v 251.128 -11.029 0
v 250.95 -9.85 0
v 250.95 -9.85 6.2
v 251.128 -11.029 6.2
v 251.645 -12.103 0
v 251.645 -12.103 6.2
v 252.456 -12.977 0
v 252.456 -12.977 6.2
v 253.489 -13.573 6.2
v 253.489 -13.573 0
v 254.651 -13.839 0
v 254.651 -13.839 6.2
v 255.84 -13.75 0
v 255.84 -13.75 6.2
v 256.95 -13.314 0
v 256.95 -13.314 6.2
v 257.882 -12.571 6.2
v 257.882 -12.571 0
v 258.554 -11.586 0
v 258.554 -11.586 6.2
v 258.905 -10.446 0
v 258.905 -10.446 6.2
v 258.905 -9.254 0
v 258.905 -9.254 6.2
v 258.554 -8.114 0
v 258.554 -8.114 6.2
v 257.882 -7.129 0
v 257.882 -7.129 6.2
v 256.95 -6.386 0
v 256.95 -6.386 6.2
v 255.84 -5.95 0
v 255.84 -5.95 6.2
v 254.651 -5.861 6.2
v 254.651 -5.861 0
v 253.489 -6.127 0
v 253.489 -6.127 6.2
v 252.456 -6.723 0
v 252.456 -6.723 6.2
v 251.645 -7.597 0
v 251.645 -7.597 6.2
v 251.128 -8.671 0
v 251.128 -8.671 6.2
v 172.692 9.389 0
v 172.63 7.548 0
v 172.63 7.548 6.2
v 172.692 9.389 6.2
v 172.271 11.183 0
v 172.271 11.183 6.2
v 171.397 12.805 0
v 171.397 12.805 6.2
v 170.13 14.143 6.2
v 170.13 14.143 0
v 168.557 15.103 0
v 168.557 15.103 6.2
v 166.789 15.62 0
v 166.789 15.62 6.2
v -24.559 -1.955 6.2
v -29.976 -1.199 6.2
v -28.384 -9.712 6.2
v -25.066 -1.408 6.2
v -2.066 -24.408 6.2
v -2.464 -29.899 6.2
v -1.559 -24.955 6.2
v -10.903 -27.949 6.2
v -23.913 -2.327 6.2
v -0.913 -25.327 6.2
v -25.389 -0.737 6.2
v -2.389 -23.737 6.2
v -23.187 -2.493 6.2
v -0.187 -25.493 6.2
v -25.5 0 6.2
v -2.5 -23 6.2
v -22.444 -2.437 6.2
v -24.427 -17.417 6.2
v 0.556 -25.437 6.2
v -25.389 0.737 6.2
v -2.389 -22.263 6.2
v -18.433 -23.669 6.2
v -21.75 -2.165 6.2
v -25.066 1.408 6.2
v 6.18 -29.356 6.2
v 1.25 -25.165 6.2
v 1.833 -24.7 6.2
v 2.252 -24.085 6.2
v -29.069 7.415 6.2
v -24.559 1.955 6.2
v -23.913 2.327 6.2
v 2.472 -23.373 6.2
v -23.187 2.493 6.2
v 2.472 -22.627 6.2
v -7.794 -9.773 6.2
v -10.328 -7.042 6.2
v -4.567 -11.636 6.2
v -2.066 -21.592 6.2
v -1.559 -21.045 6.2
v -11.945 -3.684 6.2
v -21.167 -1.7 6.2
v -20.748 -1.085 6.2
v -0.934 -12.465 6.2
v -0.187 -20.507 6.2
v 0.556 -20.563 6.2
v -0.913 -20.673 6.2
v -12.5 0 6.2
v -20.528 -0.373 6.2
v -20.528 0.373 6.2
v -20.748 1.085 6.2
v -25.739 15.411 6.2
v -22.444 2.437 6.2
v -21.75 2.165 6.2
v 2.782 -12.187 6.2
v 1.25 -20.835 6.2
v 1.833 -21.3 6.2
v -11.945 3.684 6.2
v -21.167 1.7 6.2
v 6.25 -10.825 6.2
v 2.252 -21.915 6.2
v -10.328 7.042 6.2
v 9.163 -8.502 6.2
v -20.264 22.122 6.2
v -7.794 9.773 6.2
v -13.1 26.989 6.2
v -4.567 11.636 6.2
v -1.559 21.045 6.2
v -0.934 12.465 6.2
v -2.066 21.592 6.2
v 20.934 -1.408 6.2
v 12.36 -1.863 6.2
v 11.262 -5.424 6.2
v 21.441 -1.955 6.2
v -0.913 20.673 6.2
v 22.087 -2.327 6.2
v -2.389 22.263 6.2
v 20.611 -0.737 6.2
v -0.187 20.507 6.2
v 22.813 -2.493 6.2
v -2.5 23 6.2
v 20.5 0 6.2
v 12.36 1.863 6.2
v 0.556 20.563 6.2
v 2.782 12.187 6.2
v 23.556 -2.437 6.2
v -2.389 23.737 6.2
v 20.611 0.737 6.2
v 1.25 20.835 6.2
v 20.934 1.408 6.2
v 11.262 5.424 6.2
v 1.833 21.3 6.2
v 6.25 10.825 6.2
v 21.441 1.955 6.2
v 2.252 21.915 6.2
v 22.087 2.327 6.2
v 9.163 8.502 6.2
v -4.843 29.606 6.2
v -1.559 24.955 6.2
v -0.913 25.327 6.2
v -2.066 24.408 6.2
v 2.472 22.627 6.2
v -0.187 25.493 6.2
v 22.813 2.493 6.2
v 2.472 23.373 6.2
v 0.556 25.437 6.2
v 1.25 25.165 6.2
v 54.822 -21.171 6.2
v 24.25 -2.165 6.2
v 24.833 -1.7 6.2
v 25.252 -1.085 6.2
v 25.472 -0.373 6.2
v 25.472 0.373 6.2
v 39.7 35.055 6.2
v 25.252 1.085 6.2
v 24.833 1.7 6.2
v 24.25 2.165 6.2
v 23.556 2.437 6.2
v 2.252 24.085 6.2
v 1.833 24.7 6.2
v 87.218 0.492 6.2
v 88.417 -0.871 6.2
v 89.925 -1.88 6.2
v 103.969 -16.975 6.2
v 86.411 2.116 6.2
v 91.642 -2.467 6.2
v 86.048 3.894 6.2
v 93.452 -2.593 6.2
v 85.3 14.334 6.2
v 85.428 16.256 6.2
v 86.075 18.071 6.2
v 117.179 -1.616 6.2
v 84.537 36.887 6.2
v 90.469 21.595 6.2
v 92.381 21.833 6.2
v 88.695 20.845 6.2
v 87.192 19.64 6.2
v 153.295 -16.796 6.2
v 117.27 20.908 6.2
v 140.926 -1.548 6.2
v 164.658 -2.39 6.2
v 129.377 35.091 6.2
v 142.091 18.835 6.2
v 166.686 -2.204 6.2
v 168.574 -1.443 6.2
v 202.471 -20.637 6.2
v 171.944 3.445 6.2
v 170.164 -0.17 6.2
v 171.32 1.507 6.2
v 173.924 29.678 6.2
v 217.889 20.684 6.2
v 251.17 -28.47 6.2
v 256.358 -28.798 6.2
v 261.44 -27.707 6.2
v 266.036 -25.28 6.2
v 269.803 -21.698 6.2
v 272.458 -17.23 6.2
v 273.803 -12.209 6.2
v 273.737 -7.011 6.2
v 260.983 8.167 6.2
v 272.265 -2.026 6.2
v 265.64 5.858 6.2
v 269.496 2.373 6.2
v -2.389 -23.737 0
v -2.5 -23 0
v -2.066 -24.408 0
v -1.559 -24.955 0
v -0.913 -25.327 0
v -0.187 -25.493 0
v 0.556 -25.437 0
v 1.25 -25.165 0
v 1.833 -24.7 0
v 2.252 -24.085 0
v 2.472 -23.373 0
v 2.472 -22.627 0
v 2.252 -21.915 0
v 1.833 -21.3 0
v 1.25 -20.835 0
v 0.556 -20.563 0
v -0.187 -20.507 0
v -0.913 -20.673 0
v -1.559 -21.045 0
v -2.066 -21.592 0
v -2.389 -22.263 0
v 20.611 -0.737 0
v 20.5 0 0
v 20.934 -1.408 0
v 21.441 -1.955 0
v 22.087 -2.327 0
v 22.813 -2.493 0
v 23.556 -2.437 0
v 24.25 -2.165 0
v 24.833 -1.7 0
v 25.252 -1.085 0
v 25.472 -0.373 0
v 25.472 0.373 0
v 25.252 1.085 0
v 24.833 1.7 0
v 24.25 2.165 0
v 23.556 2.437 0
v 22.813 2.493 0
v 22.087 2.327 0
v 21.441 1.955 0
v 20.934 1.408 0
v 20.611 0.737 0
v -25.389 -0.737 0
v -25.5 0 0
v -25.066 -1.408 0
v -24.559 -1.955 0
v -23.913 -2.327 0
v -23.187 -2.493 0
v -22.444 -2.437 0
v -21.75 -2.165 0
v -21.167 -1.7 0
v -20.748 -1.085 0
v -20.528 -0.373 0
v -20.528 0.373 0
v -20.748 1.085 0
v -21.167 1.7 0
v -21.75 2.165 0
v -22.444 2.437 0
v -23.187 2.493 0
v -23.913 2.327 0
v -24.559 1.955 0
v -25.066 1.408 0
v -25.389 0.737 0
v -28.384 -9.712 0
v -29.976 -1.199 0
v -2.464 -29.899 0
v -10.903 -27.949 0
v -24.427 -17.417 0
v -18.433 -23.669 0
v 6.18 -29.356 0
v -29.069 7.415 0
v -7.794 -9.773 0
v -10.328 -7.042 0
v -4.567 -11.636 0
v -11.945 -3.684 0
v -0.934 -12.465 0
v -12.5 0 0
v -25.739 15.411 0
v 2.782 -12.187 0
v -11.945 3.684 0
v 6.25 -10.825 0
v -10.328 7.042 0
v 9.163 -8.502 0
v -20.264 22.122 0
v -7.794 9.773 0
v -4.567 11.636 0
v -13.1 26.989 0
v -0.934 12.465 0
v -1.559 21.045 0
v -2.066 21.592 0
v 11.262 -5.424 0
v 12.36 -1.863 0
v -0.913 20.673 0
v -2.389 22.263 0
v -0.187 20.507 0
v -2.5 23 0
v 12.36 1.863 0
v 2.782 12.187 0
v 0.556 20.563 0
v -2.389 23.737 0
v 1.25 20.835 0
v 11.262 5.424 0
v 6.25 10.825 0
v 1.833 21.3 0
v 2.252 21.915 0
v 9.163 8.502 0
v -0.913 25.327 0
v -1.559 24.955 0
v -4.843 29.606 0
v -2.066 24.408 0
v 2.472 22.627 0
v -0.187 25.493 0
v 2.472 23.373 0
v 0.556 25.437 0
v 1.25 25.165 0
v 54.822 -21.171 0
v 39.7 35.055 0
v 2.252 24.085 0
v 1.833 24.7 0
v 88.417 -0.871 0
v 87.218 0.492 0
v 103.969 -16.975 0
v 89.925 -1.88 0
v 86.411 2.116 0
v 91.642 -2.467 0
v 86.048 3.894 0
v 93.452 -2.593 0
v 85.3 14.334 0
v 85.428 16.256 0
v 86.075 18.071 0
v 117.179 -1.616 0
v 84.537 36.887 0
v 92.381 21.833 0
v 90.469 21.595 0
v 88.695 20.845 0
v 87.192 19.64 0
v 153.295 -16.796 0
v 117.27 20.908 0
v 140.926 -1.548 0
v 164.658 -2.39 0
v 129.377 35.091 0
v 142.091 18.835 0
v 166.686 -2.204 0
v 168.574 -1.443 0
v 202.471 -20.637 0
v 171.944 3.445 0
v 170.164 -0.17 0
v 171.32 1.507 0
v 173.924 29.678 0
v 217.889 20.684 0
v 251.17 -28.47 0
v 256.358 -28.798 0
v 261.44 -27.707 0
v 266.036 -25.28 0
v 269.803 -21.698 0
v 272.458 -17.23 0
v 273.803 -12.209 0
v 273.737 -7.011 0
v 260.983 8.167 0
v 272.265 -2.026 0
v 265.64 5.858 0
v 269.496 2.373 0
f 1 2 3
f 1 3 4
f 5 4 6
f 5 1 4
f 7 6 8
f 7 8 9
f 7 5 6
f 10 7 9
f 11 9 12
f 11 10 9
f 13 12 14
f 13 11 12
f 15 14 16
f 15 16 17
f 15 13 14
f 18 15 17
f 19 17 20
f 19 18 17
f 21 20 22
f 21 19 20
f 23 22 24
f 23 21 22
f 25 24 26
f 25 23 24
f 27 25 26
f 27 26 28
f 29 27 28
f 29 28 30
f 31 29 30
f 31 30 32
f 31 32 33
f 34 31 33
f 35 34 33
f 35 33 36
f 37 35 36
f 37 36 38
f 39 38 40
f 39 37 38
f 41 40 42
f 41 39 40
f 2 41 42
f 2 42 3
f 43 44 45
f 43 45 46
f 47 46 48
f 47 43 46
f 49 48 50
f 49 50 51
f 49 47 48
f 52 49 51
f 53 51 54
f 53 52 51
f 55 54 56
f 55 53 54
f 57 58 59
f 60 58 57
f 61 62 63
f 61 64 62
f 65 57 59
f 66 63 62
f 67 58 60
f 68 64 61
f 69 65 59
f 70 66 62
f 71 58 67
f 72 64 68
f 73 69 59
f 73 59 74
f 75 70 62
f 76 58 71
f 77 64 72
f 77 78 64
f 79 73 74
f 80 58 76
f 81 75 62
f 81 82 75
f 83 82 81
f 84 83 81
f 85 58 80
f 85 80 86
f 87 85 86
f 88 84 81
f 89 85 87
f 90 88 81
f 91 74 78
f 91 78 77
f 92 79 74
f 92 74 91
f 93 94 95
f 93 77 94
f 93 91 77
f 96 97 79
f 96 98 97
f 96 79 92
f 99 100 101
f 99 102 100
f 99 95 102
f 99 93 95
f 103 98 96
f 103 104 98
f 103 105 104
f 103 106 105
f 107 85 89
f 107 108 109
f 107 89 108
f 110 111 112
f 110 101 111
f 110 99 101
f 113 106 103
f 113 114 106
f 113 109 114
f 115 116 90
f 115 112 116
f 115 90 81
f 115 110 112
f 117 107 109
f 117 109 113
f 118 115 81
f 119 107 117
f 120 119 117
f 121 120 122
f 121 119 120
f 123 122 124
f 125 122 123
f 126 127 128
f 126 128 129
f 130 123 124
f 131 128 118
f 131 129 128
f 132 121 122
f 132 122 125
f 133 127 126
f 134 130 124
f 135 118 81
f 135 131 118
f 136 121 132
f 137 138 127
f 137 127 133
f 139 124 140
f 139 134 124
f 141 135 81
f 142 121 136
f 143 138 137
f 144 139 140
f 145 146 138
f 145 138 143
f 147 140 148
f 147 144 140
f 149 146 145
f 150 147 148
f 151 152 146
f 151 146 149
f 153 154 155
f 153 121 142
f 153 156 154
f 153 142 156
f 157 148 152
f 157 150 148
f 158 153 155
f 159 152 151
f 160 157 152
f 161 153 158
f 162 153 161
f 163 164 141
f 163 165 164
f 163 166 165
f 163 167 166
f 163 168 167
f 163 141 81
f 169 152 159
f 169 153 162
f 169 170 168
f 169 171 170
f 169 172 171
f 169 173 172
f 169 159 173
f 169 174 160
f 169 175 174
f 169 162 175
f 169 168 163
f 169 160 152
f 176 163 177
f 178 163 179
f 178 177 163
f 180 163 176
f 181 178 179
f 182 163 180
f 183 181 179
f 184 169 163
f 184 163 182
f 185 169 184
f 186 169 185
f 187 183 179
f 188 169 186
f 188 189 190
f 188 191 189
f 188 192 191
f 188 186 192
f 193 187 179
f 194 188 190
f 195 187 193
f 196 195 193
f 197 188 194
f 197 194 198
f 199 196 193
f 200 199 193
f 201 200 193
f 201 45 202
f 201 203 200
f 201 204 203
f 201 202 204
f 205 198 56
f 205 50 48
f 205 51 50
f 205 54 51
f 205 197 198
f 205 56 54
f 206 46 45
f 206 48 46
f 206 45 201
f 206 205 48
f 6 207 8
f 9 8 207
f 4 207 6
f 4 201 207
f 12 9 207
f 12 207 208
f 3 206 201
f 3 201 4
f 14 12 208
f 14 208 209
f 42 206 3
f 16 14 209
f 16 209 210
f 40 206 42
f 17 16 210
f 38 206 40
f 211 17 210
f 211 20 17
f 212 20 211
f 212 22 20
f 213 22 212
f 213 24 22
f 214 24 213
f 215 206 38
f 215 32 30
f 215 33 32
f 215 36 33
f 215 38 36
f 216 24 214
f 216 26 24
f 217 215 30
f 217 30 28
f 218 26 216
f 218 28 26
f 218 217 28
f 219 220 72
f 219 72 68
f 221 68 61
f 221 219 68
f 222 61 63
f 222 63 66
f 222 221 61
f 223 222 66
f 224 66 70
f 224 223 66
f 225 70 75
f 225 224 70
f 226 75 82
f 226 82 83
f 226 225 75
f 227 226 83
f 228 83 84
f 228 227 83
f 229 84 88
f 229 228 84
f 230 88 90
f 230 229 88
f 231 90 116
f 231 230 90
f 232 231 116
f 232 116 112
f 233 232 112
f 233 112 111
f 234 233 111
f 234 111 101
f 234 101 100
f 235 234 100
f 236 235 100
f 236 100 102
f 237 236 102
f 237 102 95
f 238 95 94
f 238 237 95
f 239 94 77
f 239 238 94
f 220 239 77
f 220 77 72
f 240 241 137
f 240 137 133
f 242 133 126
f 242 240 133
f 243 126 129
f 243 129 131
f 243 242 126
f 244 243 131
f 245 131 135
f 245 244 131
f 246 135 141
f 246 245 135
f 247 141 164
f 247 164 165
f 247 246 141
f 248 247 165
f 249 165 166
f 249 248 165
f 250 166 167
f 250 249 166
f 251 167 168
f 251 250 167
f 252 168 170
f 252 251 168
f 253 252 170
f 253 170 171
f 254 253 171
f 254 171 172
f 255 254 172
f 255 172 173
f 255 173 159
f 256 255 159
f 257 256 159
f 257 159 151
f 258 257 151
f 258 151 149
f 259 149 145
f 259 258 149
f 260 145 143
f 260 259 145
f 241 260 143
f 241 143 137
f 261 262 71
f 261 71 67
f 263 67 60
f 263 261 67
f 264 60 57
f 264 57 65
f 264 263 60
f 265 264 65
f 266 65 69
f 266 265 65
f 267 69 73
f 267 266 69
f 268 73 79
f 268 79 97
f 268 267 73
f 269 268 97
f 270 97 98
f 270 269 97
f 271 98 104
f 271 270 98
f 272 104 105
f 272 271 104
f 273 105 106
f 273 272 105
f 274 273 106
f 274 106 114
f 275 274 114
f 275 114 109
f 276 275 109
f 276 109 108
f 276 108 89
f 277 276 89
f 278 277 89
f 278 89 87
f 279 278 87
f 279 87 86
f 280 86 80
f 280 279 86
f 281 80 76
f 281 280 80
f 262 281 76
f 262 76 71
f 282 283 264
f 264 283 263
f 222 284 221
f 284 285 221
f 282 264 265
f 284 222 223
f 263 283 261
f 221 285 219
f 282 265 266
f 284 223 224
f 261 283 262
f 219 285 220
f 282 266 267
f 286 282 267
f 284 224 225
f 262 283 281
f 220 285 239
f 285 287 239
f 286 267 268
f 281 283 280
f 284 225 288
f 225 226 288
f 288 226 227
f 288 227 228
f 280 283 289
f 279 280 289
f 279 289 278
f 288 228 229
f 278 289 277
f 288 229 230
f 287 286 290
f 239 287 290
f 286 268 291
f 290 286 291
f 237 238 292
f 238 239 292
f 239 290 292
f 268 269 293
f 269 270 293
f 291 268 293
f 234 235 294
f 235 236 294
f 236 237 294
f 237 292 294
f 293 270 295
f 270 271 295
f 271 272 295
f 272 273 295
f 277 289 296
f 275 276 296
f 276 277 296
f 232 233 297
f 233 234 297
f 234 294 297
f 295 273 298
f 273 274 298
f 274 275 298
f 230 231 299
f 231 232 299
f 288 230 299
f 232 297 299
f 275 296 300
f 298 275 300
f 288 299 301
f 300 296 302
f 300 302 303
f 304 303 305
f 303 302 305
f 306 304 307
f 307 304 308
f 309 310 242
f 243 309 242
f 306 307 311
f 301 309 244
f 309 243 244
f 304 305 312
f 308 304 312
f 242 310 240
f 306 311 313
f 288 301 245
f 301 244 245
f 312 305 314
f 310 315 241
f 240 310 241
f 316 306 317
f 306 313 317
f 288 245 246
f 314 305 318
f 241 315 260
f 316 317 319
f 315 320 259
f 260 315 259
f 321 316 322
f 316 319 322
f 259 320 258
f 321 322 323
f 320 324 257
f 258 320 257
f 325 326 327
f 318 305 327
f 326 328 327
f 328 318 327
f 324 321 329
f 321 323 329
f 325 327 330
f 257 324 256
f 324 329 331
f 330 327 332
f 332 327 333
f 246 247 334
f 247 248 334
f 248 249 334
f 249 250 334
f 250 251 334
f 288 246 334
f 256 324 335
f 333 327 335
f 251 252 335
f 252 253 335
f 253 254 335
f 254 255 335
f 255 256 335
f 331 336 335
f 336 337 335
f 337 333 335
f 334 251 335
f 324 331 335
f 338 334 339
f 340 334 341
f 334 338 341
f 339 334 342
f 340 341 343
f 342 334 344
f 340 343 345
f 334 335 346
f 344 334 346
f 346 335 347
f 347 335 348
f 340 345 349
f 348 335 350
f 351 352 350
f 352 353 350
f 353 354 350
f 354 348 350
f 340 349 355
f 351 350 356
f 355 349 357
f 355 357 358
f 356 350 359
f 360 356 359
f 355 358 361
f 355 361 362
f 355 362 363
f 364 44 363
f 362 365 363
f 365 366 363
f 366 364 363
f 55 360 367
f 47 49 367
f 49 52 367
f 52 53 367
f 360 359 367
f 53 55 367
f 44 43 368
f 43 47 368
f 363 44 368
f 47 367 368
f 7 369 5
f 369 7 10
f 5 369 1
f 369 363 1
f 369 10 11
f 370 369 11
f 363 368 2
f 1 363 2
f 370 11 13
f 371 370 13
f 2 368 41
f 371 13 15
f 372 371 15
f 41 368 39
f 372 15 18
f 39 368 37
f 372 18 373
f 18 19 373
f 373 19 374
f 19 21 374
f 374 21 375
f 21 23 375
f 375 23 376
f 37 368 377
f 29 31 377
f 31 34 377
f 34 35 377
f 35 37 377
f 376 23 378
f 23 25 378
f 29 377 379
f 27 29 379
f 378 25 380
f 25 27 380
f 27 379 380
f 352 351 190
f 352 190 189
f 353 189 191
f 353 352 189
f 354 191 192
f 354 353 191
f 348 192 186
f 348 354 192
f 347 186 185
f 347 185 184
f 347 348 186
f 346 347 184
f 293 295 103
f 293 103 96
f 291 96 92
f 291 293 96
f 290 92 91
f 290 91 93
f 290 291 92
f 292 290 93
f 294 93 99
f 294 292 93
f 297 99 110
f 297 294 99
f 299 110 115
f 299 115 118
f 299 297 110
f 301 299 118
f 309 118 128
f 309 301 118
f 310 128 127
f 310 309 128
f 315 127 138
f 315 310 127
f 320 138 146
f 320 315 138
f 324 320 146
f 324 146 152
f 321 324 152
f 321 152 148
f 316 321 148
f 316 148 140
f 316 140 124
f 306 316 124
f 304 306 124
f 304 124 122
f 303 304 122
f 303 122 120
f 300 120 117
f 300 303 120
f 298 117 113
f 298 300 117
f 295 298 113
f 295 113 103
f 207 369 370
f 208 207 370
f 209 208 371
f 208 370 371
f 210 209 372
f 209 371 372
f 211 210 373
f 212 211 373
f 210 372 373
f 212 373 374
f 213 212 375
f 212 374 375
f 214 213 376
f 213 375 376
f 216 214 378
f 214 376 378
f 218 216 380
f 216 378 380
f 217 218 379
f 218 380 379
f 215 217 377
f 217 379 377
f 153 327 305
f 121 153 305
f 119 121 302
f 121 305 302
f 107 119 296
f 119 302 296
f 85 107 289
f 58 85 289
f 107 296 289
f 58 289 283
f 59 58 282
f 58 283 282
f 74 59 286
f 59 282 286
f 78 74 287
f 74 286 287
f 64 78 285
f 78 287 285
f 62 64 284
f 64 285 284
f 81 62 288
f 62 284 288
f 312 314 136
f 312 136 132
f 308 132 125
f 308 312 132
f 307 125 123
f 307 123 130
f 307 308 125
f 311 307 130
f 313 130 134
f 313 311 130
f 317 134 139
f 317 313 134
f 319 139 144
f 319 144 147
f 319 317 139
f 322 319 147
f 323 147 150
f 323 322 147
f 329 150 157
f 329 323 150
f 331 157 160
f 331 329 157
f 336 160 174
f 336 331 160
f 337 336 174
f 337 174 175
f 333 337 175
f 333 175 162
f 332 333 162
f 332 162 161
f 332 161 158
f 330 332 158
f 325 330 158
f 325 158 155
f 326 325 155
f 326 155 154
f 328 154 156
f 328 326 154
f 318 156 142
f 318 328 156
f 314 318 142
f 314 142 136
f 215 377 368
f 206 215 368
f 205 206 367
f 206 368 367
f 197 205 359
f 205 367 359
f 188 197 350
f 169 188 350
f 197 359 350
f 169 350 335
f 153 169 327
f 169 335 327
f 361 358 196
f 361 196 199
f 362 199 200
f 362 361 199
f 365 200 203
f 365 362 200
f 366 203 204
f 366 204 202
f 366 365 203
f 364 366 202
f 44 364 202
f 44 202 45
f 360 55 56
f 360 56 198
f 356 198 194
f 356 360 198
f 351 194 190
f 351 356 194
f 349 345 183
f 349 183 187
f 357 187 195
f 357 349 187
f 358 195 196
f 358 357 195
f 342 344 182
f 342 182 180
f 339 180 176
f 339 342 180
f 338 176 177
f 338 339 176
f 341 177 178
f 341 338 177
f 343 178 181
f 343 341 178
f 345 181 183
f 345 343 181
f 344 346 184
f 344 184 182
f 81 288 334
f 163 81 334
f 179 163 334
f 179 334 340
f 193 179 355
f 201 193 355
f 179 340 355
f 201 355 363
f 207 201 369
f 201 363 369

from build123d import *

# Parameters (mm, degrees)
SKETCH1_R           = 4
SKETCH1_R_2         = 2.5
SKETCH1_R_3         = 12.5
BOSS_EXTRUDE1_DEPTH = 6.2


with BuildPart() as part:
    # Sketch1 → Boss-Extrude1 (new body)
    with BuildSketch(Plane.XY):
        with BuildLine():
            ThreePointArc((-4.843381354, 29.606446208), (-29.489039073, -5.513308858), (6.180402599, -29.356474988))
            ThreePointArc((6.180402599, -29.356474988), (128.63005147, -16.382678773), (251.170355628, -28.47026553))
            ThreePointArc((251.170355628, -28.47026553), (273.303133895, -14.765534175), (260.982883768, 8.166778664))
            ThreePointArc((260.982883768, 8.166778664), (129.376669821, 35.090841966), (-4.843381354, 29.606446208))
        make_face()
        with Locations(Location((254.95, -9.85, 0), (0, 0, 180))):
            Circle(SKETCH1_R, mode=Mode.SUBTRACT)
        with Locations(Location((0, 23, 0), (0, 0, 180))):
            Circle(SKETCH1_R_2, mode=Mode.SUBTRACT)
        with Locations(Location((0, -23, 0), (0, 0, 180))):
            Circle(SKETCH1_R_2, mode=Mode.SUBTRACT)
        with Locations(Location((-23, 0, 0), (0, 0, 180))):
            Circle(SKETCH1_R_2, mode=Mode.SUBTRACT)
        with Locations(Location((23, 0, 0), (0, 0, 180))):
            Circle(SKETCH1_R_2, mode=Mode.SUBTRACT)
        with Locations(Location((0, 0, 0), (0, 0, 180))):
            Circle(SKETCH1_R_3, mode=Mode.SUBTRACT)
        with BuildLine():
            Line((85.299988347, 14.334161591), (86.047515876, 3.894174942))
            ThreePointArc((86.047515876, 3.894174942), (88.416575223, -0.870831987), (93.451584576, -2.593160073))
            ThreePointArc((93.451584576, -2.593160073), (129.051714651, -1.468455886), (164.657677356, -2.390215498))
            ThreePointArc((164.657677356, -2.390215498), (169.415573807, -0.864394835), (171.943987902, 3.445225739))
            Line((171.943987902, 3.445225739), (172.629734019, 7.547504331))
            ThreePointArc((172.629734019, 7.547504331), (171.396804828, 12.804877005), (166.788880257, 15.62038992))
            ThreePointArc((166.788880257, 15.62038992), (129.692411097, 20.014503602), (92.380913243, 21.833400801))
            ThreePointArc((92.380913243, 21.833400801), (87.192448356, 19.639856576), (85.299988347, 14.334161591))
        make_face(mode=Mode.SUBTRACT)
    extrude(amount=BOSS_EXTRUDE1_DEPTH)


solid = part.part
